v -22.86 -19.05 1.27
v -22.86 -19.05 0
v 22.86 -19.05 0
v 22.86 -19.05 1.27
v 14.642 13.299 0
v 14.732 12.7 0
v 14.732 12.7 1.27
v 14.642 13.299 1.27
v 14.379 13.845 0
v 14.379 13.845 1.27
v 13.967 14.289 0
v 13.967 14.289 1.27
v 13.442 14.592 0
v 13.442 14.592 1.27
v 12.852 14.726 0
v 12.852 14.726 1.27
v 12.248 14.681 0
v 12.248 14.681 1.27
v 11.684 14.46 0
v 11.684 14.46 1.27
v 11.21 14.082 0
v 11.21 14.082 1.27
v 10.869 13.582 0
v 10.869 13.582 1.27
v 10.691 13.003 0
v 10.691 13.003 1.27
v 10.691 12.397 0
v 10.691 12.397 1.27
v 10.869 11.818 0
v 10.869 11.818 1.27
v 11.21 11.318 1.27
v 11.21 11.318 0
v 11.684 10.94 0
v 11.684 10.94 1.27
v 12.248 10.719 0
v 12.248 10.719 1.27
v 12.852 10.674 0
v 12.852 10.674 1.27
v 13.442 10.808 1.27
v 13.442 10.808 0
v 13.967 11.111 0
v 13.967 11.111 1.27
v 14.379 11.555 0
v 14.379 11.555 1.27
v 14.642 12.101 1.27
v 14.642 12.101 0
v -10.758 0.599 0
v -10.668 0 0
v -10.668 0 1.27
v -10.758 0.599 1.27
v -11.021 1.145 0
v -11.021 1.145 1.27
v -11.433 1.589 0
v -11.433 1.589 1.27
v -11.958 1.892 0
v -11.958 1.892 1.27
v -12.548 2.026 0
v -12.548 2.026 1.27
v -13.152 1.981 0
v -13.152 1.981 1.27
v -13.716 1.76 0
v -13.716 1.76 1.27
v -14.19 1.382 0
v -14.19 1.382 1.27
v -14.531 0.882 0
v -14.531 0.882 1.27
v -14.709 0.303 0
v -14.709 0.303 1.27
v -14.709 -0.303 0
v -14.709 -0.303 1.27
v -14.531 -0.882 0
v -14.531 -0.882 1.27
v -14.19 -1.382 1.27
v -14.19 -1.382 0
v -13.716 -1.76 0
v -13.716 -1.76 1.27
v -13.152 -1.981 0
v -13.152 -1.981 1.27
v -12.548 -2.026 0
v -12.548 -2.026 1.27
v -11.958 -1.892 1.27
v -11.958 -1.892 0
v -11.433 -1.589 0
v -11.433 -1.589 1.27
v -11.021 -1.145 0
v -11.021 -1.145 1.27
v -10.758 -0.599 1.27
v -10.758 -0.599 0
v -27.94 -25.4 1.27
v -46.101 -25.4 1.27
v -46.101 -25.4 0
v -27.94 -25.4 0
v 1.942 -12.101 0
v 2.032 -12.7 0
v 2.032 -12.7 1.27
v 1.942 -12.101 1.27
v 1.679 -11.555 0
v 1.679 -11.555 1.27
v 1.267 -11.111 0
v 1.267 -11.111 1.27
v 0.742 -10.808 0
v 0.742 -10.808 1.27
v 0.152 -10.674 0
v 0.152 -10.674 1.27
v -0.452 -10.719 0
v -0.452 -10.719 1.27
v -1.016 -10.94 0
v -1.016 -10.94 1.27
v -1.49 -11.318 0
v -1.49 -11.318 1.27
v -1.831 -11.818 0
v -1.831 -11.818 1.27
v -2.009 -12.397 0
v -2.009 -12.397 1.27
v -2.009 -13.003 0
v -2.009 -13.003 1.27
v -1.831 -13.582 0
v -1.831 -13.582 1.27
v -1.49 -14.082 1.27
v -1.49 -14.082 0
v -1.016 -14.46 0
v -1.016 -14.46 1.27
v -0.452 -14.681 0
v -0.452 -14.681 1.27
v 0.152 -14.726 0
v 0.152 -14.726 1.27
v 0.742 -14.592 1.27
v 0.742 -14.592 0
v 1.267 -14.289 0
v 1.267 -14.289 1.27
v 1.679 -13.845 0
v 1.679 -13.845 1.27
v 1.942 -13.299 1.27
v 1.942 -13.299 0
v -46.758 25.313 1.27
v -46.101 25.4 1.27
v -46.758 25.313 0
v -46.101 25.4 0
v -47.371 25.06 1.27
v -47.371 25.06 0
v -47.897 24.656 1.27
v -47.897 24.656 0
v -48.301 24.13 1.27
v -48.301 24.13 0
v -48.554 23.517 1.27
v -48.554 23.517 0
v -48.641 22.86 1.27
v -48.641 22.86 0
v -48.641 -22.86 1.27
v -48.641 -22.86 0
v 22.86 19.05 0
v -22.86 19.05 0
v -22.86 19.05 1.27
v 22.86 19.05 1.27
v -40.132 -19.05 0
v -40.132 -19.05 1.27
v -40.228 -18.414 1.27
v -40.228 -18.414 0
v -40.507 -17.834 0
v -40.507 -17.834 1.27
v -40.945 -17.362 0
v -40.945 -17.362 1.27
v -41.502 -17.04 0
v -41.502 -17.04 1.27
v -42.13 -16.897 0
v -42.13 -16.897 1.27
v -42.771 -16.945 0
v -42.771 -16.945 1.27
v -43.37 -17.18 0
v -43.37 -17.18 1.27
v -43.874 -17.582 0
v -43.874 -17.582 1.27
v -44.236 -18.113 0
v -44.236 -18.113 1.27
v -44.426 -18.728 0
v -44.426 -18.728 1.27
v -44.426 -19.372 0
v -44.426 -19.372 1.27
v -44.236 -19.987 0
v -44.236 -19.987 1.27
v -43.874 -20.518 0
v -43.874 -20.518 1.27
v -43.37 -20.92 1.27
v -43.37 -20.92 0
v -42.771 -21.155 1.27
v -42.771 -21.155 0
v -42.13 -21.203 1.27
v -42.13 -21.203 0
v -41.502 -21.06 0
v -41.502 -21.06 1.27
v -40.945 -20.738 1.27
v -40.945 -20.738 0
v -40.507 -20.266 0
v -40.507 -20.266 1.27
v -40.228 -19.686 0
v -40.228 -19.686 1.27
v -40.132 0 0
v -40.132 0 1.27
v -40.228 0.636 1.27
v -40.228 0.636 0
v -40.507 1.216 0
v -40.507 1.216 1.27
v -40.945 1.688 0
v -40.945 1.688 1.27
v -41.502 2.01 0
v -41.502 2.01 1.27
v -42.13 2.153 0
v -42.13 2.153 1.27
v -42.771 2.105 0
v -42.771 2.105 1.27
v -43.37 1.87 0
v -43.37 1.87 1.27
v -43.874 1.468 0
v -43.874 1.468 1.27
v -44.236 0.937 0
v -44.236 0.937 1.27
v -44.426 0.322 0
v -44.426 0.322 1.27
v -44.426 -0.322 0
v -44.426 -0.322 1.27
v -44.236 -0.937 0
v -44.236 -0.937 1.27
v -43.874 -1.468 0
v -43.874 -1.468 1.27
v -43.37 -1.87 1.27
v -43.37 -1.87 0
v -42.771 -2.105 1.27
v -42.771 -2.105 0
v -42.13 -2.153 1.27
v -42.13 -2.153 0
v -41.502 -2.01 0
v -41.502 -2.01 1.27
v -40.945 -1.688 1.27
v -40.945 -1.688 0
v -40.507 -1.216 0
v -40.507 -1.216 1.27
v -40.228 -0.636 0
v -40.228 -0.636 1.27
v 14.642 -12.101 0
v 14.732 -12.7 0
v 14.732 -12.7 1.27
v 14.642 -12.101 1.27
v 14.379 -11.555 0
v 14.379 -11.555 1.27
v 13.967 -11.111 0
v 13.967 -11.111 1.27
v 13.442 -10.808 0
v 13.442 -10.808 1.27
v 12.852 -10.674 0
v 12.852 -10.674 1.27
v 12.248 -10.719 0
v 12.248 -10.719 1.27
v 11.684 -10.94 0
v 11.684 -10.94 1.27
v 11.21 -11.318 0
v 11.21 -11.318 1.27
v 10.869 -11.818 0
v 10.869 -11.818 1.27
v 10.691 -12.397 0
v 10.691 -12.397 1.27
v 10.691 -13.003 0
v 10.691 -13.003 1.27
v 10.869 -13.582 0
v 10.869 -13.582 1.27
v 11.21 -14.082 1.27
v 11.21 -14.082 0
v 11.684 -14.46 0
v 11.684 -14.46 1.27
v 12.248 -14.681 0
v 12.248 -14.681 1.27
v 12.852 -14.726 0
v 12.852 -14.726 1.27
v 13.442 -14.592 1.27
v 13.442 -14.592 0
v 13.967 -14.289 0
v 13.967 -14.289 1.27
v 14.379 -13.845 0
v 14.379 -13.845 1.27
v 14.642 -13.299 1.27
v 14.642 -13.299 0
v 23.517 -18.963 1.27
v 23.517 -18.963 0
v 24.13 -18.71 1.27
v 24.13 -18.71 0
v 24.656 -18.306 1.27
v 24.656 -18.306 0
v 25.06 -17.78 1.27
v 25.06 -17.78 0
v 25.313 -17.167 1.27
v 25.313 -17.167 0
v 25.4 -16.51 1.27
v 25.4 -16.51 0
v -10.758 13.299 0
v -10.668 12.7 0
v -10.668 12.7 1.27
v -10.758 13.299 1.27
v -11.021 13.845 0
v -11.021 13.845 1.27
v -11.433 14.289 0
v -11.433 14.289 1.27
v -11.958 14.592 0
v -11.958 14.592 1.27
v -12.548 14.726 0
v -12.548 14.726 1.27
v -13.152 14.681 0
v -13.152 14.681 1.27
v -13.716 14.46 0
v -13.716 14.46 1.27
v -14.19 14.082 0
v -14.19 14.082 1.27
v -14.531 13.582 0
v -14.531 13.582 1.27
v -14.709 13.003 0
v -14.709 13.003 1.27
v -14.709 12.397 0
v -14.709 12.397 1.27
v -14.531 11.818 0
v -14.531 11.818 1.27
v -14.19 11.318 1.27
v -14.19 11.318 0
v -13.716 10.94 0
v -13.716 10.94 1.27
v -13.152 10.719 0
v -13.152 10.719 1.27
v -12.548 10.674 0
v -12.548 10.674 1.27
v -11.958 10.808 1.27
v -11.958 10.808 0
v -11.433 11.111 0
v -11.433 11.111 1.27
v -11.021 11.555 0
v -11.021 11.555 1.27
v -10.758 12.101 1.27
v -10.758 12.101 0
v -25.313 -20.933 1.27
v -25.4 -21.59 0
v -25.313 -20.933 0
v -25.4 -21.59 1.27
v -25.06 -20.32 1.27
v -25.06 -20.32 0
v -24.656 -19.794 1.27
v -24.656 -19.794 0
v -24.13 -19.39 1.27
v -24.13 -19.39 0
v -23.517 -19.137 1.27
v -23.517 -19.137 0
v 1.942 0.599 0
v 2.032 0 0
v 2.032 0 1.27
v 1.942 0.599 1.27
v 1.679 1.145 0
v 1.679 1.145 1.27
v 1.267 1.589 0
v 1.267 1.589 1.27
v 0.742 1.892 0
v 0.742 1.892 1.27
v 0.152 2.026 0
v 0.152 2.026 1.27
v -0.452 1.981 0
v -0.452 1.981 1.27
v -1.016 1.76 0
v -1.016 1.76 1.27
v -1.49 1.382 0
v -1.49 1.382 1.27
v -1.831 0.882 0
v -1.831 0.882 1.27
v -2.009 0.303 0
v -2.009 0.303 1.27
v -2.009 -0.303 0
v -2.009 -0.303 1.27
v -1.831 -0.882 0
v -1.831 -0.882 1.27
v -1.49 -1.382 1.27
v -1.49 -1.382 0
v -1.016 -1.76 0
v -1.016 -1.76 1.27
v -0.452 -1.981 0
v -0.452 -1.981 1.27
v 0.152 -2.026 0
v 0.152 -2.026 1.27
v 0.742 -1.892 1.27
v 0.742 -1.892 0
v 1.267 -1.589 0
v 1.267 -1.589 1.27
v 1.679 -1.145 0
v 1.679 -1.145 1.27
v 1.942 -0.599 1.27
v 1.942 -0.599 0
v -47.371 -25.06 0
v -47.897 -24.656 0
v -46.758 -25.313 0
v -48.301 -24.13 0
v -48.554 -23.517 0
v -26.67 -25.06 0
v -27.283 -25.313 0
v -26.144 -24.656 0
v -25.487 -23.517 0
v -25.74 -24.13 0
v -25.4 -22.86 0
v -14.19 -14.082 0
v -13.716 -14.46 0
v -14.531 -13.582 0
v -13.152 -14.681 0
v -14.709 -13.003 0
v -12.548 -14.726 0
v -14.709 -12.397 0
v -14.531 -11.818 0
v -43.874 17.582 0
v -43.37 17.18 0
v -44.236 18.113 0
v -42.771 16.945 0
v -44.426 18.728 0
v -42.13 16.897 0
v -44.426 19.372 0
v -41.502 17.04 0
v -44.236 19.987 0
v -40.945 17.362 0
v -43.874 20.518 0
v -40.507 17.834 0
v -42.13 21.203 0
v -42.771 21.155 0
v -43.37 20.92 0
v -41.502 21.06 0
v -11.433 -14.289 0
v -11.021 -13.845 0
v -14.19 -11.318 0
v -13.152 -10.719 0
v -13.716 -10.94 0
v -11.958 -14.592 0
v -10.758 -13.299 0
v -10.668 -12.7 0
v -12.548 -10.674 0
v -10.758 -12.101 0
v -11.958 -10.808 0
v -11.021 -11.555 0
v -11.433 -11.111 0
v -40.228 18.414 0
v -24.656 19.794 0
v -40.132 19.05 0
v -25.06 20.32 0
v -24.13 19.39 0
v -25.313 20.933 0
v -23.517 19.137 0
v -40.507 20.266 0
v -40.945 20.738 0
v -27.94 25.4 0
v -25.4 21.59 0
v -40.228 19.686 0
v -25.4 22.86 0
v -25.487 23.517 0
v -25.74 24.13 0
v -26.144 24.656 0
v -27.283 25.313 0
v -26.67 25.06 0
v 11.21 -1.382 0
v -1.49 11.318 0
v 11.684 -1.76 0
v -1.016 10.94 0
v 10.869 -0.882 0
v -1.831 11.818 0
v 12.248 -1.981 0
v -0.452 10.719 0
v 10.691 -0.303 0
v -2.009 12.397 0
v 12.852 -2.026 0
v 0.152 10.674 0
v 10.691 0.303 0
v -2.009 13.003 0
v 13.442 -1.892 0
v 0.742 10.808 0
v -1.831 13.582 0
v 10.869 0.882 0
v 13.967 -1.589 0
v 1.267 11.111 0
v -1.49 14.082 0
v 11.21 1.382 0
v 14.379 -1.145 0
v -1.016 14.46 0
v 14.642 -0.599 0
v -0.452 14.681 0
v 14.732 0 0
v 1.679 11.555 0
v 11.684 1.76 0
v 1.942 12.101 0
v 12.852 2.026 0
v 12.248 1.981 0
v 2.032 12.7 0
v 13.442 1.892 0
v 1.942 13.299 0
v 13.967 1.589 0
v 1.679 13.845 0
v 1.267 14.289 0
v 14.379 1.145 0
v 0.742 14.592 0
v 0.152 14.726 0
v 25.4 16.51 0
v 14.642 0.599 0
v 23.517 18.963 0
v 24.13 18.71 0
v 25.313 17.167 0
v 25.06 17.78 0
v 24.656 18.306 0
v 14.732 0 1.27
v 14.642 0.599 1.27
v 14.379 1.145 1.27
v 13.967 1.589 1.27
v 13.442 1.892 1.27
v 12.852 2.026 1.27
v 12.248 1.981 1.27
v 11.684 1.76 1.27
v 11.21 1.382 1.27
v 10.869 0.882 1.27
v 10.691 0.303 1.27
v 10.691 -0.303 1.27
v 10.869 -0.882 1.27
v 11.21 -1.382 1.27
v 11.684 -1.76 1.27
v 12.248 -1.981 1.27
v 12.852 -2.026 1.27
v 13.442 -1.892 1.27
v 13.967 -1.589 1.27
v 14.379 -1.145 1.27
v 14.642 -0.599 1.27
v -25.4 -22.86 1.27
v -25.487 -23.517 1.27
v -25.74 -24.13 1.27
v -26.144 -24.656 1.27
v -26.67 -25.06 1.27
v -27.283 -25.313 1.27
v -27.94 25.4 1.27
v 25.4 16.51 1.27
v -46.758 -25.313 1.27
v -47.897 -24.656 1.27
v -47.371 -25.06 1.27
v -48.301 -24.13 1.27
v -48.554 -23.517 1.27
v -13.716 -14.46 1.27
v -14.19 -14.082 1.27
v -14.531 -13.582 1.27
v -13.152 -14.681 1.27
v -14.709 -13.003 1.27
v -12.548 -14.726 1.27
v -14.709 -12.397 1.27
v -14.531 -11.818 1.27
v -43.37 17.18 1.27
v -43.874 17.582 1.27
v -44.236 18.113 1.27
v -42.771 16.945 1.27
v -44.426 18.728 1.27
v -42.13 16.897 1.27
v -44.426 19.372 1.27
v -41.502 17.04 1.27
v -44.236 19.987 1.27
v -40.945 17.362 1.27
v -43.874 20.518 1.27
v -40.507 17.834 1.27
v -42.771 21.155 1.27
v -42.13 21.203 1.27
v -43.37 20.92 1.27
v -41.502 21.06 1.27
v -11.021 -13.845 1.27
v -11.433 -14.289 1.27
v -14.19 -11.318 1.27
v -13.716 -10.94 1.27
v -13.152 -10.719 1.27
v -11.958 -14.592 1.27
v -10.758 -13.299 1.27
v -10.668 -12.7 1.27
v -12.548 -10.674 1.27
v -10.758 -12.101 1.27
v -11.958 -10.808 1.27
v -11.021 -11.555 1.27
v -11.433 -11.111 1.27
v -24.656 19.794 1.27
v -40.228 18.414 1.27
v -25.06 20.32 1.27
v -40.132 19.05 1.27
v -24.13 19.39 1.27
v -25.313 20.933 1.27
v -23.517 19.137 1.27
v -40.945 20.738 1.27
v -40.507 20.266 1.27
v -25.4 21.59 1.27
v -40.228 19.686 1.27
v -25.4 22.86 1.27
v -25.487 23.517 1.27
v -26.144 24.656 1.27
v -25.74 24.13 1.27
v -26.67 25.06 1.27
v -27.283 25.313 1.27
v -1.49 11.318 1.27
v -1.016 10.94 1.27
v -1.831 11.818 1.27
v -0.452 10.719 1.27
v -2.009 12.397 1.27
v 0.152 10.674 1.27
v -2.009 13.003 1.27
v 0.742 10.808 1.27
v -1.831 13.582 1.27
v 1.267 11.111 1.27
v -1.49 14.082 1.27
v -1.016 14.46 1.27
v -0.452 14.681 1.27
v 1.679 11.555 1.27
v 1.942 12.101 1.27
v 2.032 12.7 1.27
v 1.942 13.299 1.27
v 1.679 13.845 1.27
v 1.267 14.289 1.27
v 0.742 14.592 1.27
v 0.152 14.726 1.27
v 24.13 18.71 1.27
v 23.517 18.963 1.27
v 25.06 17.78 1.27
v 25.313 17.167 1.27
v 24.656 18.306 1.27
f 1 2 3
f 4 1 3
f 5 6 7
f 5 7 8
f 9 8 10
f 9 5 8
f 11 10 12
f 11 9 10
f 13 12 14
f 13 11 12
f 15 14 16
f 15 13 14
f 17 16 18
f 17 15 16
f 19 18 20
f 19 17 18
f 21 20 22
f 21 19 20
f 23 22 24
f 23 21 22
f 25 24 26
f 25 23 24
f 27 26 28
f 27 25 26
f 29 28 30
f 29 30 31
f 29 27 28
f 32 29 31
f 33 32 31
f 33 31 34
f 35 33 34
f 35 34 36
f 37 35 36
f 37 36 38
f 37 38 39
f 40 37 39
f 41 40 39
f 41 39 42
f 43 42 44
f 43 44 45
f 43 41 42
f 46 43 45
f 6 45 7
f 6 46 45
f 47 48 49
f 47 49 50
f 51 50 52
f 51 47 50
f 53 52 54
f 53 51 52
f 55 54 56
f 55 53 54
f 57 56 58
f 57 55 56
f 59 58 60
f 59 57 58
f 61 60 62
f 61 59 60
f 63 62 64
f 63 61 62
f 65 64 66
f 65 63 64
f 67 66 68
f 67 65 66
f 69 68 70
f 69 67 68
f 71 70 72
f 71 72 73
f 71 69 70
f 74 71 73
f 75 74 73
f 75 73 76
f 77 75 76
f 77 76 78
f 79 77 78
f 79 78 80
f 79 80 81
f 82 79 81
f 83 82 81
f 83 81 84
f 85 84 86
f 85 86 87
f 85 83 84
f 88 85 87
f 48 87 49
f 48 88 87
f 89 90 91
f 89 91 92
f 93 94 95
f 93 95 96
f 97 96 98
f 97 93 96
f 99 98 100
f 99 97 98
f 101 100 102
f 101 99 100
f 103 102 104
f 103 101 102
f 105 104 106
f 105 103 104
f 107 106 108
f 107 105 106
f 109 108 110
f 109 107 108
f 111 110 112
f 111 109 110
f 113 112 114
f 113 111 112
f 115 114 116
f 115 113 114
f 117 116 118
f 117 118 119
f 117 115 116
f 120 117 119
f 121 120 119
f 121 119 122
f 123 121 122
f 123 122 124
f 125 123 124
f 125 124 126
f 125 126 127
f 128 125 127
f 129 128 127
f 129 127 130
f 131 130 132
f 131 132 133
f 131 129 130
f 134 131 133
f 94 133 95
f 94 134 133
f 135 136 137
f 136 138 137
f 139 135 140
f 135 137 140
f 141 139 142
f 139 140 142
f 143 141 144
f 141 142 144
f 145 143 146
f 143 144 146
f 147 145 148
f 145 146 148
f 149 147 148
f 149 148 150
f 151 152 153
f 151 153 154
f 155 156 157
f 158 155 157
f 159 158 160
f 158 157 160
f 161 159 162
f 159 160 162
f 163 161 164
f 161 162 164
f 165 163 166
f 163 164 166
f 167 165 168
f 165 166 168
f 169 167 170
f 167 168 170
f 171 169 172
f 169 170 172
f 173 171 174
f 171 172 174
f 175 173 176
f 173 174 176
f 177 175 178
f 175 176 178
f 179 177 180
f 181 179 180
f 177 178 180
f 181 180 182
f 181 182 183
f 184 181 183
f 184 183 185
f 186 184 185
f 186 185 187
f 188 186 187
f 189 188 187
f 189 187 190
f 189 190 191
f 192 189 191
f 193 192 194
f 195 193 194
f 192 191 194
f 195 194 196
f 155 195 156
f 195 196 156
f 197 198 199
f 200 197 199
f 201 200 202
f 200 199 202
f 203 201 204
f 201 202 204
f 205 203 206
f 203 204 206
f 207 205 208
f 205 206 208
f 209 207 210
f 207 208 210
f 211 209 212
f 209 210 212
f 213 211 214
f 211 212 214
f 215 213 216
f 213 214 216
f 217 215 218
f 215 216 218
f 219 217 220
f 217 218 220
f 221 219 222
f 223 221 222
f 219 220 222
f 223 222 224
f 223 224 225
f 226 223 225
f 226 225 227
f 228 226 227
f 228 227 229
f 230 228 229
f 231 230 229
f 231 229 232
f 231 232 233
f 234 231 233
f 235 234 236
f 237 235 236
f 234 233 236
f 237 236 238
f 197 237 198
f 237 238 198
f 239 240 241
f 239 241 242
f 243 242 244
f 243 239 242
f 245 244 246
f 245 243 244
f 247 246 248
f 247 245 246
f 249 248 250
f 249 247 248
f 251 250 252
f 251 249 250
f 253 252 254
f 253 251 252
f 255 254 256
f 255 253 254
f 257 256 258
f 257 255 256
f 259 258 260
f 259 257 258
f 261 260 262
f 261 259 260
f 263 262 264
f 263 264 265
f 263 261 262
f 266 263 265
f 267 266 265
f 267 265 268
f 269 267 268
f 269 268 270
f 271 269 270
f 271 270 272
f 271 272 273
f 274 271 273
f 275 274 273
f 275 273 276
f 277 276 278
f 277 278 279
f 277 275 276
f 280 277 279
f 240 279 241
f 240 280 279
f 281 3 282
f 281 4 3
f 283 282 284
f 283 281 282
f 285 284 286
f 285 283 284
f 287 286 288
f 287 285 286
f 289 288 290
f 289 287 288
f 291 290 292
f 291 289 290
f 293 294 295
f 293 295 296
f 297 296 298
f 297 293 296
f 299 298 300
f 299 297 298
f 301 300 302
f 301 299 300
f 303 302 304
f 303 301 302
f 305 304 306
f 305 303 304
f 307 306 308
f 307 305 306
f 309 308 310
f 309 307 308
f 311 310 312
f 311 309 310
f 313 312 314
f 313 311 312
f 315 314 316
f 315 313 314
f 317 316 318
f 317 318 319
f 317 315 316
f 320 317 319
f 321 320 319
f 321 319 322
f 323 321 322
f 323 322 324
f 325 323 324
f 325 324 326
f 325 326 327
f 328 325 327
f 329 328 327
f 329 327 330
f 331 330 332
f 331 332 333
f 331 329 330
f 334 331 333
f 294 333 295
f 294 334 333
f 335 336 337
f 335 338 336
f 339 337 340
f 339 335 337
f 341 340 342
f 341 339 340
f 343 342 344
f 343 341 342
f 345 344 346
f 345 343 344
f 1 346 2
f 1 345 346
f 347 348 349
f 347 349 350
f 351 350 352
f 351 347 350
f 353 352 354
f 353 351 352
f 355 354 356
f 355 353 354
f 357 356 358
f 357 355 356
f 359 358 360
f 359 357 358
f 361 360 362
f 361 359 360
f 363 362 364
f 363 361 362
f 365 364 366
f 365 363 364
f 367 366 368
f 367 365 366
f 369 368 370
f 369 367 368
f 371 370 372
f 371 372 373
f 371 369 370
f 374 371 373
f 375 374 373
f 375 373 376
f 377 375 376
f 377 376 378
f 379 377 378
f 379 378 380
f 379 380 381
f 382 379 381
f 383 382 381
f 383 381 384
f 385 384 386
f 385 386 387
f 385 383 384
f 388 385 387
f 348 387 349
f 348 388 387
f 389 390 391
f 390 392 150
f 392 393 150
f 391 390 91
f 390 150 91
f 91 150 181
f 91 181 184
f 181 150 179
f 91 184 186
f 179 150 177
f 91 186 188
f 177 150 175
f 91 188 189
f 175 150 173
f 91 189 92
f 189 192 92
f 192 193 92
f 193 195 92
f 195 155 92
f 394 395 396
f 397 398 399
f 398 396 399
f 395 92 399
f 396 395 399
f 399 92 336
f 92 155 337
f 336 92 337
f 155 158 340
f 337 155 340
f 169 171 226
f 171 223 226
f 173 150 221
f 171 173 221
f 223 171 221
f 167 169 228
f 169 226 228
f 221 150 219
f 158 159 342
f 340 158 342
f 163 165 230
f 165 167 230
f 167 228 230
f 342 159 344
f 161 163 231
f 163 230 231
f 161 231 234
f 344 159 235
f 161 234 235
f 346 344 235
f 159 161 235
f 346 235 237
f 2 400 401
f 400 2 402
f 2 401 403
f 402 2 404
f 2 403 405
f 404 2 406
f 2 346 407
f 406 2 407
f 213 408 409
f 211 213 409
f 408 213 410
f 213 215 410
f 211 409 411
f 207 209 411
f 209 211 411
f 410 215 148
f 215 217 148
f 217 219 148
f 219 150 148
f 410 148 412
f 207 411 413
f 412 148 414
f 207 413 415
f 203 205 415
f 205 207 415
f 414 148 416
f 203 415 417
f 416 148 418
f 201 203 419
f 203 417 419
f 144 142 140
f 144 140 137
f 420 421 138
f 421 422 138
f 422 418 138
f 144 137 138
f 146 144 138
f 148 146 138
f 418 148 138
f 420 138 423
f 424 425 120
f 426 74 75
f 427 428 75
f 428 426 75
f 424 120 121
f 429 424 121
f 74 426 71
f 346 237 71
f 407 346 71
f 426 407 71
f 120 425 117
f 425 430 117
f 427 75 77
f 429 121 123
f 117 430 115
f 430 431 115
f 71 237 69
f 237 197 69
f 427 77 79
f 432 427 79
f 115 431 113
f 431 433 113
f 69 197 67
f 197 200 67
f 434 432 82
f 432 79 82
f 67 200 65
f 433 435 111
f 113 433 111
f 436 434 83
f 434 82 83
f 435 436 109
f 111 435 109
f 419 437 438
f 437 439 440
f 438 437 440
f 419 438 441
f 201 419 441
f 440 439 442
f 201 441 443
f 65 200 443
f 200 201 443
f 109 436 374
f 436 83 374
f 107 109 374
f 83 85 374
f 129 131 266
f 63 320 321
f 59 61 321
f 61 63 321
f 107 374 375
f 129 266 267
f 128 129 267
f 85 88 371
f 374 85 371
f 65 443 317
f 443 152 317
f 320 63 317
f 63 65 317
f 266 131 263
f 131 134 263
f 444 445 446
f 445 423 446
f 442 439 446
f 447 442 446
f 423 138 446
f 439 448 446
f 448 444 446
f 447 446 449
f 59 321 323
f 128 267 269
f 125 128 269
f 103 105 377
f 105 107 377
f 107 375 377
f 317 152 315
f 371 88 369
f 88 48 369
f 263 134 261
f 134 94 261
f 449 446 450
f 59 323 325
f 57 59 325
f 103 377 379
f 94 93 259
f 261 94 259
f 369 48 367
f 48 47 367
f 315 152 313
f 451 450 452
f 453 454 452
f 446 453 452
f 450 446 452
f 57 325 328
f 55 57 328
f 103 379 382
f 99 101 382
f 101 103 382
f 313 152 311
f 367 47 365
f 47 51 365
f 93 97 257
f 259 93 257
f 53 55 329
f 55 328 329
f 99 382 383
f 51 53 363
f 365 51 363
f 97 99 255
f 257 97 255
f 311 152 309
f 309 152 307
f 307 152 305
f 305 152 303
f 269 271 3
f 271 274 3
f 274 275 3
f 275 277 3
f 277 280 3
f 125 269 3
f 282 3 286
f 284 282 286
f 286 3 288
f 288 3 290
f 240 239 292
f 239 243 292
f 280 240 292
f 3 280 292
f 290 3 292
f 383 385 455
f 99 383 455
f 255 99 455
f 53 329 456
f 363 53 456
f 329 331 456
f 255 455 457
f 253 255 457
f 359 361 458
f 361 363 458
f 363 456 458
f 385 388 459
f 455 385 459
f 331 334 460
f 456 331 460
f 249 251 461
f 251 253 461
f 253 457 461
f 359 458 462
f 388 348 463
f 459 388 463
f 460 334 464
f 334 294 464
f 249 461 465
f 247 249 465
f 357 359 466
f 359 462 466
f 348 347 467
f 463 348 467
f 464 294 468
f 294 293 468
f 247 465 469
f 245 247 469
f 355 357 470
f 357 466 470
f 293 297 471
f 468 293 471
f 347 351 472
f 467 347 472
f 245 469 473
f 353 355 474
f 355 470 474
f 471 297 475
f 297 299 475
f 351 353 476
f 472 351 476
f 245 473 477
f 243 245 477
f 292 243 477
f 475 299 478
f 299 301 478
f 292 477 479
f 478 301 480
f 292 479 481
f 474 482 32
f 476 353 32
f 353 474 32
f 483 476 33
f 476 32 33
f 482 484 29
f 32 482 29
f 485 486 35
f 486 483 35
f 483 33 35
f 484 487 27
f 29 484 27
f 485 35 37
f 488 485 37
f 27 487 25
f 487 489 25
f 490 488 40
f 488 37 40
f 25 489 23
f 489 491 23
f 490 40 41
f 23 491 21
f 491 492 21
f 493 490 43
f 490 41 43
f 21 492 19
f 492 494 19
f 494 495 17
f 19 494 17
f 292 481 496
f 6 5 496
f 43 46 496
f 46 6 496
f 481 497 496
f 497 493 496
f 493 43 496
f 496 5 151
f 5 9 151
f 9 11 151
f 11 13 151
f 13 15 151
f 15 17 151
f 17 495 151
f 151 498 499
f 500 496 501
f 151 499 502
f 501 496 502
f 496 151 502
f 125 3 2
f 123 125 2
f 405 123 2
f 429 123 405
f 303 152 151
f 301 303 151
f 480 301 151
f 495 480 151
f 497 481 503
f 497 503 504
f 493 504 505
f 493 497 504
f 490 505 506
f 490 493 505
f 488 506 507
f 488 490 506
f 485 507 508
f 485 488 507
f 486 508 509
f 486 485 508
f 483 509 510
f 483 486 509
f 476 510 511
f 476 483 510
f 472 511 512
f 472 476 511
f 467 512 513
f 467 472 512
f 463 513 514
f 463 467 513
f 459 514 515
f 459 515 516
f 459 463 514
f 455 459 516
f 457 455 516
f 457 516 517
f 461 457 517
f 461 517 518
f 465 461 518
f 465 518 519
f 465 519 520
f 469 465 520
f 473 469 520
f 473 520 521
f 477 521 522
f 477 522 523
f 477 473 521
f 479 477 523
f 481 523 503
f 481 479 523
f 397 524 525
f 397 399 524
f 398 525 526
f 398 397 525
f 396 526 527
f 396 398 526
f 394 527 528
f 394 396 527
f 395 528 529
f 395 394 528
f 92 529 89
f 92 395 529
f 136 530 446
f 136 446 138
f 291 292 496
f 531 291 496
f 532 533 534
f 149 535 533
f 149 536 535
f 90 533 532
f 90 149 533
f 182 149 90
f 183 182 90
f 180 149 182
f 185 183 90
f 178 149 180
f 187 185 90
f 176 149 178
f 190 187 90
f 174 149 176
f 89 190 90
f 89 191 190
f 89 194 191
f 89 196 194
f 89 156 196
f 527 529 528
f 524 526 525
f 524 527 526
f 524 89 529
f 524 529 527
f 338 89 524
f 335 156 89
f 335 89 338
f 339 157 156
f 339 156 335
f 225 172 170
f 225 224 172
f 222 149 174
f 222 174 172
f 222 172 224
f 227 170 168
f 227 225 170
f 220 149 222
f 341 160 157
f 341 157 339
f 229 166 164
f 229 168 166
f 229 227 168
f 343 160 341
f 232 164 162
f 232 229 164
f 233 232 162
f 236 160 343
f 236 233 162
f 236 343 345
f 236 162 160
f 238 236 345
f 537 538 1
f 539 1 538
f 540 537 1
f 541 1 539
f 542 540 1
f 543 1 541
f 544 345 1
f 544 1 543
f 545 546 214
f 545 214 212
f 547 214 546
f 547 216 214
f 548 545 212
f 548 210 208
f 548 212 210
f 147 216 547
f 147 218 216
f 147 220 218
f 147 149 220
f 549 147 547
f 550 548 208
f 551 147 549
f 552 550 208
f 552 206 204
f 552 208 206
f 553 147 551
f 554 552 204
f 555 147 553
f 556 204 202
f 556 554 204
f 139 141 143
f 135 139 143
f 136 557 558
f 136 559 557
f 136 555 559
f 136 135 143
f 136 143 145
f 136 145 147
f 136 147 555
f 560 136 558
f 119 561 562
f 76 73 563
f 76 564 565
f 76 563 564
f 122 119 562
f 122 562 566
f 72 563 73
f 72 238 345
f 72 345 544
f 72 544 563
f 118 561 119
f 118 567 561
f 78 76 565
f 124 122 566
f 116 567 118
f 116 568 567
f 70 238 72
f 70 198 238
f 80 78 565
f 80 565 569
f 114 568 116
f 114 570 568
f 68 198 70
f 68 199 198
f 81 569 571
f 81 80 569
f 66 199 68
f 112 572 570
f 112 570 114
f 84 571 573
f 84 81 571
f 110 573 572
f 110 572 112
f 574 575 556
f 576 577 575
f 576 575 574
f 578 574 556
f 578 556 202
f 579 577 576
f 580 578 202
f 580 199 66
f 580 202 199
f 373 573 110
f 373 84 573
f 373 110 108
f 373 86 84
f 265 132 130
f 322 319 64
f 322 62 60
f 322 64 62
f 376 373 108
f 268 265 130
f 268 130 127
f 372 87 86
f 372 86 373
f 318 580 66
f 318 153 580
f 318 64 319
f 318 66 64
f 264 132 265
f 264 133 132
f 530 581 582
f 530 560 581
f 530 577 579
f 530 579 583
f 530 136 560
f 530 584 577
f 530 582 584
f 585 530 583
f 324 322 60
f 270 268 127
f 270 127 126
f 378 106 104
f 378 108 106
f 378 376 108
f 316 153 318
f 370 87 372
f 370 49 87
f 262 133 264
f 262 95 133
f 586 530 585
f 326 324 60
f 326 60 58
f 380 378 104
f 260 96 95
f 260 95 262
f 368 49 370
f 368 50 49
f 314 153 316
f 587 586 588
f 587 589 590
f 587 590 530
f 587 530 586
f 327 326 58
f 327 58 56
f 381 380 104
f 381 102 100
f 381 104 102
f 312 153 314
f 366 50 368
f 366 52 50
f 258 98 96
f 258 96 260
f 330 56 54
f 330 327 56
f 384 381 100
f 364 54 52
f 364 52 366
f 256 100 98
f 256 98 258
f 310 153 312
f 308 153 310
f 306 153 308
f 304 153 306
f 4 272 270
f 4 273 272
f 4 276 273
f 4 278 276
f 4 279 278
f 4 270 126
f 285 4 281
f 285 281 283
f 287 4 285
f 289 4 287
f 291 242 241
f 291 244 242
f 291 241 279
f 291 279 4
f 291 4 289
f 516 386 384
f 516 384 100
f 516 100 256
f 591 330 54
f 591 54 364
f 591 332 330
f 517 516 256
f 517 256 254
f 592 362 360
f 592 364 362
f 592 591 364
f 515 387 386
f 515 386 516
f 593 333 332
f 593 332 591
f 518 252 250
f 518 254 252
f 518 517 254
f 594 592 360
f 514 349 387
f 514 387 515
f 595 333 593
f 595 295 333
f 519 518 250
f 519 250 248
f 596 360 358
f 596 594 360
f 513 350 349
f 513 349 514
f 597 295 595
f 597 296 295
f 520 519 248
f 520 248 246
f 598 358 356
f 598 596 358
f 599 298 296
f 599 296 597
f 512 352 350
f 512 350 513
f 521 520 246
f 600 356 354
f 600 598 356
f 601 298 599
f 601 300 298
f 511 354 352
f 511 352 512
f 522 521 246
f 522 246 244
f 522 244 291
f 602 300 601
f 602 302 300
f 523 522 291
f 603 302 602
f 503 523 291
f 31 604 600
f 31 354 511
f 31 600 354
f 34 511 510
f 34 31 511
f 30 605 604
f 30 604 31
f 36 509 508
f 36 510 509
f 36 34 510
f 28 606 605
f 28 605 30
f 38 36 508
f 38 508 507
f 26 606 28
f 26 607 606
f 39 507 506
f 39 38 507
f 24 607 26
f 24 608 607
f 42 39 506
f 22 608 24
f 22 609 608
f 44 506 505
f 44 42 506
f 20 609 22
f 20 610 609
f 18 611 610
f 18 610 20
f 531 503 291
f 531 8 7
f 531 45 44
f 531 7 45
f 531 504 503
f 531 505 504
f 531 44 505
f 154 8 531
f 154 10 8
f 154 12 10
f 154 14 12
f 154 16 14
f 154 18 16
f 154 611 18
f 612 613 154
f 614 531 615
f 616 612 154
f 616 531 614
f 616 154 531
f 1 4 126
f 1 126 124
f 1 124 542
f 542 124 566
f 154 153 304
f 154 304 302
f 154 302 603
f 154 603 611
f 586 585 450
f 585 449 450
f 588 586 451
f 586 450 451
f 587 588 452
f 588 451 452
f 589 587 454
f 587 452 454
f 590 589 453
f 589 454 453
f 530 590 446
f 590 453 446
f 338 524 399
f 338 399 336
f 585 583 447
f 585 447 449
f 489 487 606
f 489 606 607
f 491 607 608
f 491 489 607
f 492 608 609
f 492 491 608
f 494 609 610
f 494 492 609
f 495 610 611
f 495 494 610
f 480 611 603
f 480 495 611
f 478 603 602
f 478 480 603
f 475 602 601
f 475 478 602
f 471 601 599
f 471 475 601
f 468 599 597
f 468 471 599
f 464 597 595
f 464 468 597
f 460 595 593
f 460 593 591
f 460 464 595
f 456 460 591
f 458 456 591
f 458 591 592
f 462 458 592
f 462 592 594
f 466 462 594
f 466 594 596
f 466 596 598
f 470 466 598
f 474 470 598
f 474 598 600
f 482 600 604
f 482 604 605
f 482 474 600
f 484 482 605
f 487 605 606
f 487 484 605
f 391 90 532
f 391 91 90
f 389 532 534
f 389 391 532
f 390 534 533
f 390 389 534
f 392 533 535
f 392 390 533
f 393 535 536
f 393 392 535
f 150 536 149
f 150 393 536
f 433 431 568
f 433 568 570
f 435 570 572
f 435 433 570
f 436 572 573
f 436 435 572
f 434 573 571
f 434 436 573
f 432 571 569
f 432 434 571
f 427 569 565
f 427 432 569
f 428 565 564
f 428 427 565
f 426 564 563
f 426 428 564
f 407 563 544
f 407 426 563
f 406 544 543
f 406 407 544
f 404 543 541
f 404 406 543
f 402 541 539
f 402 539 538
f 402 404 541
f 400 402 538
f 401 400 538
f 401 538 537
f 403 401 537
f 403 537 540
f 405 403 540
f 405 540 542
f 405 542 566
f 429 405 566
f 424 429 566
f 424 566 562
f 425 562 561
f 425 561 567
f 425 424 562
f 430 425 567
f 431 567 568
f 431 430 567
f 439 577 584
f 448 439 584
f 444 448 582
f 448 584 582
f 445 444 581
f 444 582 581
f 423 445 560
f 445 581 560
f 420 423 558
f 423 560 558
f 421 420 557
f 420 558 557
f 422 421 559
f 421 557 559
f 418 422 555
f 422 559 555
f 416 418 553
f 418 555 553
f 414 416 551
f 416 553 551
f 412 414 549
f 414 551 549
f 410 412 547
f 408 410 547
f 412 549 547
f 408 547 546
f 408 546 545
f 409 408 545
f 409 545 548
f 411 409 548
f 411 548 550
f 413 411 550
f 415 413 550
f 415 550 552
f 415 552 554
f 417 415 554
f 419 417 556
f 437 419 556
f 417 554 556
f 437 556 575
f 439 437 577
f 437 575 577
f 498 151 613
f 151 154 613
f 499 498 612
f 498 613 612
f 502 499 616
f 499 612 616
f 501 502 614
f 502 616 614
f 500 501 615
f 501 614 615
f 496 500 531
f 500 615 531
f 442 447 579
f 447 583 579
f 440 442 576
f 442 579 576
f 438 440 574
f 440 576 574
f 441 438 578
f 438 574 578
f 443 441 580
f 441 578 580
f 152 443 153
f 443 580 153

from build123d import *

# Parameters (mm, degrees)
SKETCH1_W           = 50.8
SKETCH1_H           = 38.1
SKETCH1_R           = 2.032
BOSS_EXTRUDE1_DEPTH = 1.27
FILLET3_R           = 2.54
SKETCH2_R           = 2.159
BOSS_EXTRUDE2_DEPTH = 1.27
FILLET6_R           = 2.54


with BuildPart() as part:
    # Sketch1 → Boss-Extrude1 (new body)
    with BuildSketch(Plane.XY):
        Rectangle(SKETCH1_W, SKETCH1_H)
        with Locations((-12.7, 12.7)):
            Circle(SKETCH1_R, mode=Mode.SUBTRACT)
        with Locations((0, 12.7)):
            Circle(SKETCH1_R, mode=Mode.SUBTRACT)
        with Locations((12.7, 12.7)):
            Circle(SKETCH1_R, mode=Mode.SUBTRACT)
        Circle(SKETCH1_R, mode=Mode.SUBTRACT)
        with Locations((12.7, 0)):
            Circle(SKETCH1_R, mode=Mode.SUBTRACT)
        with Locations((0, -12.7)):
            Circle(SKETCH1_R, mode=Mode.SUBTRACT)
        with Locations((12.7, -12.7)):
            Circle(SKETCH1_R, mode=Mode.SUBTRACT)
        with Locations((-12.7, 0)):
            Circle(SKETCH1_R, mode=Mode.SUBTRACT)
        with Locations((-12.7, -12.7)):
            Circle(SKETCH1_R, mode=Mode.SUBTRACT)
    extrude(amount=BOSS_EXTRUDE1_DEPTH)

    # Fillet3
    fillet3_edges = [part.edges().sort_by_distance(p)[0] for p in [
        (25.4, -19.05, 0.635),
        (25.4, 19.05, 0.635),
    ]]
    fillet(fillet3_edges, radius=FILLET3_R)

    # Sketch2 → Boss-Extrude2 (add)
    with BuildSketch(Plane.XY.offset(1.27)):
        Polygon((-25.4, -25.4), (-25.4, -19.05), (-25.4, 19.05), (-25.4, 25.4), (-48.641, 25.4), (-48.641, -25.4), align=None)
        with Locations((-42.291, -19.05)):
            Circle(SKETCH2_R, mode=Mode.SUBTRACT)
        with Locations((-42.291, 0)):
            Circle(SKETCH2_R, mode=Mode.SUBTRACT)
        with Locations((-42.291, 19.05)):
            Circle(SKETCH2_R, mode=Mode.SUBTRACT)
    extrude(amount=-BOSS_EXTRUDE2_DEPTH)

    # Fillet6
    fillet6_edges = [part.edges().sort_by_distance(p)[0] for p in [
        (-25.4, 25.4, 0.635),
        (-25.4, -25.4, 0.635),
        (-48.641, -25.4, 0.635),
        (-48.641, 25.4, 0.635),
        (-25.4, -19.05, 0.635),
        (-25.4, 19.05, 0.635),
    ]]
    fillet(fillet6_edges, radius=FILLET6_R)


solid = part.part
